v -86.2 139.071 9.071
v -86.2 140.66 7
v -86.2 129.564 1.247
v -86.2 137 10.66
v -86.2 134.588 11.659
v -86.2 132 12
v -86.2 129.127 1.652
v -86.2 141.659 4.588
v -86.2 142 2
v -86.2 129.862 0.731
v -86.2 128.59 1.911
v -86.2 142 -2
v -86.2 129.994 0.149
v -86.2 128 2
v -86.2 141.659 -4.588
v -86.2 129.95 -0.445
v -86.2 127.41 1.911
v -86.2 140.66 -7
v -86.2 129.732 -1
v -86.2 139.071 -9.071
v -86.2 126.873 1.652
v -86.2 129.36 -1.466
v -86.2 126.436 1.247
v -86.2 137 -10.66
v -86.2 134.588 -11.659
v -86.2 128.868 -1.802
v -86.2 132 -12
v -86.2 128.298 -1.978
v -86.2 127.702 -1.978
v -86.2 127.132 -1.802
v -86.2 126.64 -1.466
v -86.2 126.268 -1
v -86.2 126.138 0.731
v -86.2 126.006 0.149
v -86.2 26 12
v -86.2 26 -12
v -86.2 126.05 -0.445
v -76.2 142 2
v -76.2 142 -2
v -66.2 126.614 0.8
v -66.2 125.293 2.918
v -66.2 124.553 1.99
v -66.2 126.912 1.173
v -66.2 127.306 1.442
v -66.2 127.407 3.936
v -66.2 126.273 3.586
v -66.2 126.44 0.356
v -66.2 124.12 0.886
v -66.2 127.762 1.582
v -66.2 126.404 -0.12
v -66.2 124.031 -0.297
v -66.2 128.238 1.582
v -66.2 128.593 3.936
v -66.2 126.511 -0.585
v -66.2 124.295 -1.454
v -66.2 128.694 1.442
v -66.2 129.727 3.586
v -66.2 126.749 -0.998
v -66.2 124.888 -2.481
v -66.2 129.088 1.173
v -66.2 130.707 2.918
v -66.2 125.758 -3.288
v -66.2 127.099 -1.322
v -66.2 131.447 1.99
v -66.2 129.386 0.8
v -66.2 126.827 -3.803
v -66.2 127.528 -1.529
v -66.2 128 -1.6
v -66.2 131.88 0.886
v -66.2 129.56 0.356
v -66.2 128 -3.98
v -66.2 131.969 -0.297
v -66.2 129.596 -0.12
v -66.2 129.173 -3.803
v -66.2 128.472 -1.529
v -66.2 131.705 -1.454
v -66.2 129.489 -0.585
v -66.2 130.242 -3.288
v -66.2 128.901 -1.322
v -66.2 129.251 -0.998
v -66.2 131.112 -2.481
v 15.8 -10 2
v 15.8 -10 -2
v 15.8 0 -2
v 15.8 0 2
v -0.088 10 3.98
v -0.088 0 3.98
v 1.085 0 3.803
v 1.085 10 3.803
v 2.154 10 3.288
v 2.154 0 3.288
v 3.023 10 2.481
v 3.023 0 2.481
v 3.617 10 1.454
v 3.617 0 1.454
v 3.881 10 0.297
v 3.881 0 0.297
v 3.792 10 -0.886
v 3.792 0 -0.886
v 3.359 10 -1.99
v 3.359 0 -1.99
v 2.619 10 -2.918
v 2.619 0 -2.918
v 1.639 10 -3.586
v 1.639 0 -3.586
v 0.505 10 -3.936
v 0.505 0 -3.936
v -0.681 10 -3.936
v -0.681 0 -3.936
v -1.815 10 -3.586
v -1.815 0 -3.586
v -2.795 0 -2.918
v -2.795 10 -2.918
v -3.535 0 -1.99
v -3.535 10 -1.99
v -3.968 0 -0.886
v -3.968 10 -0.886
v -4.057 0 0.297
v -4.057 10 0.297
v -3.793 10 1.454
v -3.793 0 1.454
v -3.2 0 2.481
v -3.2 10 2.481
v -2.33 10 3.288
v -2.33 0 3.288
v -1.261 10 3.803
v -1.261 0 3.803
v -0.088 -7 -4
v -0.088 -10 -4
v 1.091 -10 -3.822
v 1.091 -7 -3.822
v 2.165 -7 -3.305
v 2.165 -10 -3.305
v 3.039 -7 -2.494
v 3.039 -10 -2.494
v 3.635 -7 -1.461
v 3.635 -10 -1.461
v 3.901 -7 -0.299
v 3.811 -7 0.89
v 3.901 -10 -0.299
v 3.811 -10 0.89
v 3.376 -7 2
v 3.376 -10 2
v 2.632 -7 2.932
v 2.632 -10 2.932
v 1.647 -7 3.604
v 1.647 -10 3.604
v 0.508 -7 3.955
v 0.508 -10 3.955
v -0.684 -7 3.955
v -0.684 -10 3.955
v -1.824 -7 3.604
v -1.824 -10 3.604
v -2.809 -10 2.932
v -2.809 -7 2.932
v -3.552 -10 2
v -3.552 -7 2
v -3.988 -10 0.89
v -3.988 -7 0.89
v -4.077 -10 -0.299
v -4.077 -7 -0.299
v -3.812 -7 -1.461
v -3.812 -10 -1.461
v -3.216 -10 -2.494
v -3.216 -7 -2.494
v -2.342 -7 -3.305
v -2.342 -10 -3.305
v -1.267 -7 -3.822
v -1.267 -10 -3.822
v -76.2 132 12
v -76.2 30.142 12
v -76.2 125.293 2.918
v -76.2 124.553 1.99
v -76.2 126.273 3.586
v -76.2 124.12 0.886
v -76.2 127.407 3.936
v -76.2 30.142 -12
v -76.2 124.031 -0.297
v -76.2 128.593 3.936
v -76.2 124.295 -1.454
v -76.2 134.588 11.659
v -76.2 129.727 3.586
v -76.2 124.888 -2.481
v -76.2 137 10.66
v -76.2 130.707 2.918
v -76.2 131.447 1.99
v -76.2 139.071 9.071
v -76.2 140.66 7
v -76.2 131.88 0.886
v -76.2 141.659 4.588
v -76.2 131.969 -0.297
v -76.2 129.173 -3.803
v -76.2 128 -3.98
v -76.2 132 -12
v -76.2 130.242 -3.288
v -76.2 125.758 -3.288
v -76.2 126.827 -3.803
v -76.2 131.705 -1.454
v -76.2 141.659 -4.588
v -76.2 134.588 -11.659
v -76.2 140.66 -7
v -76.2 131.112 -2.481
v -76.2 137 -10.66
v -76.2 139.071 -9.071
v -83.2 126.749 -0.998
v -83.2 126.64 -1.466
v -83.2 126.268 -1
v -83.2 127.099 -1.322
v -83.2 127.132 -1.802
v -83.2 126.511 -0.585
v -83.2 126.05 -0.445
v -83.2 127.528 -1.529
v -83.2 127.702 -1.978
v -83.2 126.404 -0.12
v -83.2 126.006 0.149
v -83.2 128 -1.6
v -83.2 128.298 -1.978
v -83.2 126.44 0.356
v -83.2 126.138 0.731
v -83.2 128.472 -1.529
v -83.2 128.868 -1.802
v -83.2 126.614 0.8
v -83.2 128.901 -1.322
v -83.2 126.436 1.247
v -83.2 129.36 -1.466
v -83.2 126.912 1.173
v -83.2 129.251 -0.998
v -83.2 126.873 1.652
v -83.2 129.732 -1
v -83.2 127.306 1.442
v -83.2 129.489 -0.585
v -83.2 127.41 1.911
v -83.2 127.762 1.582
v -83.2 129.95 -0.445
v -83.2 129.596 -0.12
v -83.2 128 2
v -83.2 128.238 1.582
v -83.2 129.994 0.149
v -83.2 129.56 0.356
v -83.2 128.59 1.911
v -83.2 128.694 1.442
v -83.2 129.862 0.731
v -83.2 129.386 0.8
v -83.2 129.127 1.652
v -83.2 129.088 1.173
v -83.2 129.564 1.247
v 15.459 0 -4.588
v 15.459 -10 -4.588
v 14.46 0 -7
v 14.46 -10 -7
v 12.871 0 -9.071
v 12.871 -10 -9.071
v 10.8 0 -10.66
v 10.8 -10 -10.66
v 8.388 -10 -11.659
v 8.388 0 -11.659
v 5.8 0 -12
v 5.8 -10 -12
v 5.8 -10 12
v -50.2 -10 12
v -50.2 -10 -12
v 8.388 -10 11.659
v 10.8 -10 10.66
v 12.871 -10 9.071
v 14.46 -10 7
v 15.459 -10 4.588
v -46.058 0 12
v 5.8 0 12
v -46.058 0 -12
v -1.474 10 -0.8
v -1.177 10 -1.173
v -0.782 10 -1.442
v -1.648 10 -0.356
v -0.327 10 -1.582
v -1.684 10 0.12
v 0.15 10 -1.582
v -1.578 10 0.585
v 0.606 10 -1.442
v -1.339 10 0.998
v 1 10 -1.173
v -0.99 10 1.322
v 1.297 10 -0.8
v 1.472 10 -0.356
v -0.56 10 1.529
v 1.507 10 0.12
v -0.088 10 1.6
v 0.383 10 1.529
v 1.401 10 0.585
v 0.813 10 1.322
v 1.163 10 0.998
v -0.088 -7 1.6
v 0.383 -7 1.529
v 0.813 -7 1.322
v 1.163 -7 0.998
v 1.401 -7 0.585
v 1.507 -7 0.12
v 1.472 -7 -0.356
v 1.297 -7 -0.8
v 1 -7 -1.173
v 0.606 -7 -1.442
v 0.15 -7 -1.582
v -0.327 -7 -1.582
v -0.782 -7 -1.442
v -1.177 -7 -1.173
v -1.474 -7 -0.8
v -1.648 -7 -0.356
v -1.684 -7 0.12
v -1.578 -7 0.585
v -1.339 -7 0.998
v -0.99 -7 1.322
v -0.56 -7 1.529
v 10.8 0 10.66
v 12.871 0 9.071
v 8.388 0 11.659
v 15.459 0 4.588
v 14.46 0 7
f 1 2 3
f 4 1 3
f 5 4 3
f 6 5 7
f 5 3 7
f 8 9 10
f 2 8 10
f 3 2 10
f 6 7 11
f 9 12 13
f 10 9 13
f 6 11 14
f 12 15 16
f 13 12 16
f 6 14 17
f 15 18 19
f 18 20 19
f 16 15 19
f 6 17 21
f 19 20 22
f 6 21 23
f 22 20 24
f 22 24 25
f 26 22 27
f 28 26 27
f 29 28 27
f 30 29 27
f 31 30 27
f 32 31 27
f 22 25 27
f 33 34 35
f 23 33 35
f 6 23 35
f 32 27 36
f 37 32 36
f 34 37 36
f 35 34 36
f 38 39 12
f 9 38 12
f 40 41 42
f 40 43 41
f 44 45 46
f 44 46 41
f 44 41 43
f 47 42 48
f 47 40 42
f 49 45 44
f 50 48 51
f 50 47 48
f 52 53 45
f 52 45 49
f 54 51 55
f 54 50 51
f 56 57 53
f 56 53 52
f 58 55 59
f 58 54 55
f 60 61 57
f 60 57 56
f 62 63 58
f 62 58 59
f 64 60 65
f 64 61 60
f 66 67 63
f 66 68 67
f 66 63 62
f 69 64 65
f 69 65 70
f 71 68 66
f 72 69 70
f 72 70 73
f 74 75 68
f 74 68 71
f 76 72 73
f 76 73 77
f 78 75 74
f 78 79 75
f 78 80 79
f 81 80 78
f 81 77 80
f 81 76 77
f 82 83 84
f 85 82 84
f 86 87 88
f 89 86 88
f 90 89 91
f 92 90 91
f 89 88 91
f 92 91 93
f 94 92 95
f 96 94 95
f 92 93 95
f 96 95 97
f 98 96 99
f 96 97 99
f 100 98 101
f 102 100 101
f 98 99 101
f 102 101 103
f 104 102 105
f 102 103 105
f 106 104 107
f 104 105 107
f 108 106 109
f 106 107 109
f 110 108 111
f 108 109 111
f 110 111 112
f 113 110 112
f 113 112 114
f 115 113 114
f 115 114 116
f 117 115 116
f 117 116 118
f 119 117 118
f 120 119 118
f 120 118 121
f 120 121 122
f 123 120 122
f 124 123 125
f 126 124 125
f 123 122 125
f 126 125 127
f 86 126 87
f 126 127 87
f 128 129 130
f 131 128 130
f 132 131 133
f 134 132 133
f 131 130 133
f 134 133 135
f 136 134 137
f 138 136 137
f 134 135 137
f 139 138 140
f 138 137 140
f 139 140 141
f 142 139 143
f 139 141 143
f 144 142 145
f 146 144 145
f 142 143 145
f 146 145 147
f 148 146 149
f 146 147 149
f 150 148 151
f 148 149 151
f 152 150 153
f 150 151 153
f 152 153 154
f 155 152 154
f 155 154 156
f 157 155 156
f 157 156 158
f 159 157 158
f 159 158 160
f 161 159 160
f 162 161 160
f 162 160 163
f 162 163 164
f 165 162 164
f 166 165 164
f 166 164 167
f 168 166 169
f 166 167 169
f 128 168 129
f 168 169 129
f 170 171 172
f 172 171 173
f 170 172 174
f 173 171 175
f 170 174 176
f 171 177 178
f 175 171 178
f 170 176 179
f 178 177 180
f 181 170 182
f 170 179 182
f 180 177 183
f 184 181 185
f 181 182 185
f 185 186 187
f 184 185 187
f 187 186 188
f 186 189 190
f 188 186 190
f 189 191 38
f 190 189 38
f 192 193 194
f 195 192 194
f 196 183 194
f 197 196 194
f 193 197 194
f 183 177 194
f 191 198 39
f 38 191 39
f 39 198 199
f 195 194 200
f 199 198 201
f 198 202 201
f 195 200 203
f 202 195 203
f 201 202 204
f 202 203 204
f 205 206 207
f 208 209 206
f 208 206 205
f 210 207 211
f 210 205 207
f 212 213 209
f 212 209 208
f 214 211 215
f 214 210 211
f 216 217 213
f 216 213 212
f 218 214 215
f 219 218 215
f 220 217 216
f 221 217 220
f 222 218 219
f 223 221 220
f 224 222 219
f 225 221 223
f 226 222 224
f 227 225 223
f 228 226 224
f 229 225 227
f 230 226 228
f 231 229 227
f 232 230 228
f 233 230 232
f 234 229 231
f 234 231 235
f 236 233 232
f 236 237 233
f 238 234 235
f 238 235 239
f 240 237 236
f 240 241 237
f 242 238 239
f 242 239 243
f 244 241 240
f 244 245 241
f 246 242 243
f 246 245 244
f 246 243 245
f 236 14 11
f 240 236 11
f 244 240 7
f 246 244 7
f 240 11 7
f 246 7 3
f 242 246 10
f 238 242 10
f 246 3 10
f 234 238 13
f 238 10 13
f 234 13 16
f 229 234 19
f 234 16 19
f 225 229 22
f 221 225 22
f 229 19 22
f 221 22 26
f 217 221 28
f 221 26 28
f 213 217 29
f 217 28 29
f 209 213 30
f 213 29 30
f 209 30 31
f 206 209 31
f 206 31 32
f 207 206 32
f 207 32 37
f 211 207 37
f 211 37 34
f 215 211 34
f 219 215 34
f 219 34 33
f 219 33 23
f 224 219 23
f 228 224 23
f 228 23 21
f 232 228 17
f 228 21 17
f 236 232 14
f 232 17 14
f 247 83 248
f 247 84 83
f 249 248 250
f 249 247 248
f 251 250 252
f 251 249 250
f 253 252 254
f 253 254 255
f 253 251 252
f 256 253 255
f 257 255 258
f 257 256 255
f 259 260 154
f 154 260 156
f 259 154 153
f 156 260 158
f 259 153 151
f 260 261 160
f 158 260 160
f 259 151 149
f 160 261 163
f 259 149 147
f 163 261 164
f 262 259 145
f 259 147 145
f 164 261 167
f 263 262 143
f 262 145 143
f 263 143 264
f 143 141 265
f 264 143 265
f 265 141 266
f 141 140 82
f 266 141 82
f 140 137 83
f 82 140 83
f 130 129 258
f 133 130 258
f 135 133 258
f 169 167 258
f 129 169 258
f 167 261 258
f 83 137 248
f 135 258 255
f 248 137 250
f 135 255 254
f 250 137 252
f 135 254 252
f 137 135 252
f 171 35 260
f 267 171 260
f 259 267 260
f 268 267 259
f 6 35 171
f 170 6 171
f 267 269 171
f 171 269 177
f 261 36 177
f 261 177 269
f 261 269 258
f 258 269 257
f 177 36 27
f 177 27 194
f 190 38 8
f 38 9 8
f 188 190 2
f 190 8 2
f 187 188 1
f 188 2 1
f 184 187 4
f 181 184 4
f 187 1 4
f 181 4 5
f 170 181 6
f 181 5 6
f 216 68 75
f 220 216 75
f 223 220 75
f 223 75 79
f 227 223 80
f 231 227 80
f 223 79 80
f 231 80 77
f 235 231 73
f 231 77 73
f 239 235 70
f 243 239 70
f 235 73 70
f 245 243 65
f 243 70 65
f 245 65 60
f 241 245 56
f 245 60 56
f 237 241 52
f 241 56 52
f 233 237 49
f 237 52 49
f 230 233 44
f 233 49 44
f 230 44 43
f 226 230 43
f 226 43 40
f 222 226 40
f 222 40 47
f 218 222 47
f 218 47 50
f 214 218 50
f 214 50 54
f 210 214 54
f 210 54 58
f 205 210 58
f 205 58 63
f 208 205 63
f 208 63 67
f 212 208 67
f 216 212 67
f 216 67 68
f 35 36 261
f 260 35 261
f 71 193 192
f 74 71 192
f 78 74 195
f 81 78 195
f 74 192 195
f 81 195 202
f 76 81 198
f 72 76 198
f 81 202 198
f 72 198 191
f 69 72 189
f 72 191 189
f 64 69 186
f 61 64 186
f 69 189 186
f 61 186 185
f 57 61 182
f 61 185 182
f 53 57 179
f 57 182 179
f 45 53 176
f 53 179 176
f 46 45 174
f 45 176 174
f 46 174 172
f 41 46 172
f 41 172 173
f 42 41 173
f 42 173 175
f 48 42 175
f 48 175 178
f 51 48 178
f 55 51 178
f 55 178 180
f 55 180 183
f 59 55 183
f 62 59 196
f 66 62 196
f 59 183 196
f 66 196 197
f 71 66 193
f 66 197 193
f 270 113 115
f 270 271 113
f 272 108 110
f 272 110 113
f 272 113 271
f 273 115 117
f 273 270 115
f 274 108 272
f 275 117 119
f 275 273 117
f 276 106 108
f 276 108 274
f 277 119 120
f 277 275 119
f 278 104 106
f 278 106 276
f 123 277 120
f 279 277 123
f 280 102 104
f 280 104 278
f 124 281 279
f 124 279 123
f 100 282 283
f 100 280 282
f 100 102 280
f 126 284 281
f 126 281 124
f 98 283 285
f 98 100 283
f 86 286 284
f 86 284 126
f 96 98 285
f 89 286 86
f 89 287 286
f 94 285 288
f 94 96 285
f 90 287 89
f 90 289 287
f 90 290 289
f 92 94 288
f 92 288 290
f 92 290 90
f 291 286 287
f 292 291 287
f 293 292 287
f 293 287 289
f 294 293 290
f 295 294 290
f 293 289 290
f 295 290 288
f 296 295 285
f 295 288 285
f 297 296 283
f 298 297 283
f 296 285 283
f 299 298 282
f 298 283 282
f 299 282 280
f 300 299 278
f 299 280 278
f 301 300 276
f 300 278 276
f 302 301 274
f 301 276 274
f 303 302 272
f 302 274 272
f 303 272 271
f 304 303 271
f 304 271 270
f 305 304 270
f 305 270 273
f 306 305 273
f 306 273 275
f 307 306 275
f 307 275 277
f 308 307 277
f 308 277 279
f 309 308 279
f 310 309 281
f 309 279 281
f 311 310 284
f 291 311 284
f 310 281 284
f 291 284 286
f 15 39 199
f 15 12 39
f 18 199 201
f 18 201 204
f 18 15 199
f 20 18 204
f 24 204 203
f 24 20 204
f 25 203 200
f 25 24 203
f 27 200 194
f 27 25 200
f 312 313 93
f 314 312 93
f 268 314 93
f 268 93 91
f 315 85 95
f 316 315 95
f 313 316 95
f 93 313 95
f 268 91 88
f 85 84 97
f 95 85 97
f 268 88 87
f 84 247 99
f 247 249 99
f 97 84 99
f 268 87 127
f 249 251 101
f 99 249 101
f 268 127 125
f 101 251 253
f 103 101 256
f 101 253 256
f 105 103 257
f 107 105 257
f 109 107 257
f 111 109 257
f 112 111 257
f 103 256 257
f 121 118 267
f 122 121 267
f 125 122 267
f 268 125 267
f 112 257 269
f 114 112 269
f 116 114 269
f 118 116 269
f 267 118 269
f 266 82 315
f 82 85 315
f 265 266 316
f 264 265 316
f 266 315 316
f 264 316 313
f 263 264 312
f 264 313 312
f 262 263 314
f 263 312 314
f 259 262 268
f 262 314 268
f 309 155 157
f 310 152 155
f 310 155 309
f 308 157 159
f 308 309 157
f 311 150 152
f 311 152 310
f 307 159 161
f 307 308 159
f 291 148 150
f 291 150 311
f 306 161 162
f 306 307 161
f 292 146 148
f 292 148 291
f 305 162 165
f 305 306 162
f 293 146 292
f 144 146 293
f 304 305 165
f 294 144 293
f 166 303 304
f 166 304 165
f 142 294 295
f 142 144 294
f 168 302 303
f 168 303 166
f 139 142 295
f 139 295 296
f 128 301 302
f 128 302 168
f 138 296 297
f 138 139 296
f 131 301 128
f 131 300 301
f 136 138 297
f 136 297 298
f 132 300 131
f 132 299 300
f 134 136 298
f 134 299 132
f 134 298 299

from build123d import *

# Parameters (mm, degrees)
BOSS_EXTRUDE7_DEPTH      = 12
BOSS_EXTRUDE7_DEPTH_BACK = 12
FILLET1_R                = 10
SKETCH1_R                = 3.98
BOSS_EXTRUDE3_DEPTH      = 10
SKETCH5_R                = 1.6
CUT_EXTRUDE1_DEPTH       = 165.414111317
SKETCH6_R                = 2
CUT_EXTRUDE2_DEPTH       = 3
SKETCH7_R                = 3.98
BOSS_EXTRUDE5_DEPTH      = 10
SKETCH9_R                = 1.6
CUT_EXTRUDE3_DEPTH       = 17
SKETCH10_R               = 4
CUT_EXTRUDE4_DEPTH       = 3


with BuildPart() as part:
    # Sketch11 → Boss-Extrude7 (new, two sides: drawn at the far end of the back side and taken through both)
    with BuildSketch(Plane.XY.offset(-BOSS_EXTRUDE7_DEPTH_BACK)):
        Polygon((-86.2, 142), (-86.2, 26), (-50.2, -10), (15.8, -10), (15.8, 0), (-46.057864376, 0), (-76.2, 30.142135624), (-76.2, 142), align=None)
    extrude(amount=BOSS_EXTRUDE7_DEPTH + BOSS_EXTRUDE7_DEPTH_BACK)

    # Fillet1
    fillet1_edges = [part.edges().sort_by_distance(p)[0] for p in [
        (-81.2, 142, -12),
        (15.8, -5, -12),
        (15.8, -5, 12),
        (-81.2, 142, 12),
    ]]
    fillet(fillet1_edges, radius=FILLET1_R)

    # Sketch1 → Boss-Extrude3 (add)
    with BuildSketch(Plane(origin=(-76.2, 0, 0), x_dir=(0, 0, -1), z_dir=(1, 0, 0))):
        with Locations((0, 128)):
            Circle(SKETCH1_R)
    extrude(amount=BOSS_EXTRUDE3_DEPTH)

    # Sketch5 → Cut-Extrude1 (cut, through all)
    with BuildSketch(Plane(origin=(-66.2, 0, 0), x_dir=(0, 0, -1), z_dir=(1, 0, 0))):
        with Locations((0, 128)):
            Circle(SKETCH5_R)
    extrude(amount=-CUT_EXTRUDE1_DEPTH, mode=Mode.SUBTRACT)

    # Sketch6 → Cut-Extrude2 (cut)
    with BuildSketch(Plane.ZY.offset(86.2)):
        with Locations((0, 128)):
            Circle(SKETCH6_R)
    extrude(amount=-CUT_EXTRUDE2_DEPTH, mode=Mode.SUBTRACT)

    # Sketch7 → Boss-Extrude5 (add)
    with BuildSketch(Plane(origin=(0, 0, 0), x_dir=(1, 0, 0), z_dir=(0, 1, 0))):
        with Locations((-0.08822806, 0)):
            Circle(SKETCH7_R)
    extrude(amount=BOSS_EXTRUDE5_DEPTH)

    # Sketch9 → Cut-Extrude3 (cut)
    with BuildSketch(Plane(origin=(0, 10, 0), x_dir=(1, 0, 0), z_dir=(0, 1, 0))):
        with Locations((-0.08822806, 0)):
            Circle(SKETCH9_R)
    extrude(amount=-CUT_EXTRUDE3_DEPTH, mode=Mode.SUBTRACT)

    # Sketch10 → Cut-Extrude4 (cut)
    with BuildSketch(Plane.XZ.offset(10)):
        with Locations((-0.08822806, 0)):
            Circle(SKETCH10_R)
    extrude(amount=-CUT_EXTRUDE4_DEPTH, mode=Mode.SUBTRACT)


solid = part.part
